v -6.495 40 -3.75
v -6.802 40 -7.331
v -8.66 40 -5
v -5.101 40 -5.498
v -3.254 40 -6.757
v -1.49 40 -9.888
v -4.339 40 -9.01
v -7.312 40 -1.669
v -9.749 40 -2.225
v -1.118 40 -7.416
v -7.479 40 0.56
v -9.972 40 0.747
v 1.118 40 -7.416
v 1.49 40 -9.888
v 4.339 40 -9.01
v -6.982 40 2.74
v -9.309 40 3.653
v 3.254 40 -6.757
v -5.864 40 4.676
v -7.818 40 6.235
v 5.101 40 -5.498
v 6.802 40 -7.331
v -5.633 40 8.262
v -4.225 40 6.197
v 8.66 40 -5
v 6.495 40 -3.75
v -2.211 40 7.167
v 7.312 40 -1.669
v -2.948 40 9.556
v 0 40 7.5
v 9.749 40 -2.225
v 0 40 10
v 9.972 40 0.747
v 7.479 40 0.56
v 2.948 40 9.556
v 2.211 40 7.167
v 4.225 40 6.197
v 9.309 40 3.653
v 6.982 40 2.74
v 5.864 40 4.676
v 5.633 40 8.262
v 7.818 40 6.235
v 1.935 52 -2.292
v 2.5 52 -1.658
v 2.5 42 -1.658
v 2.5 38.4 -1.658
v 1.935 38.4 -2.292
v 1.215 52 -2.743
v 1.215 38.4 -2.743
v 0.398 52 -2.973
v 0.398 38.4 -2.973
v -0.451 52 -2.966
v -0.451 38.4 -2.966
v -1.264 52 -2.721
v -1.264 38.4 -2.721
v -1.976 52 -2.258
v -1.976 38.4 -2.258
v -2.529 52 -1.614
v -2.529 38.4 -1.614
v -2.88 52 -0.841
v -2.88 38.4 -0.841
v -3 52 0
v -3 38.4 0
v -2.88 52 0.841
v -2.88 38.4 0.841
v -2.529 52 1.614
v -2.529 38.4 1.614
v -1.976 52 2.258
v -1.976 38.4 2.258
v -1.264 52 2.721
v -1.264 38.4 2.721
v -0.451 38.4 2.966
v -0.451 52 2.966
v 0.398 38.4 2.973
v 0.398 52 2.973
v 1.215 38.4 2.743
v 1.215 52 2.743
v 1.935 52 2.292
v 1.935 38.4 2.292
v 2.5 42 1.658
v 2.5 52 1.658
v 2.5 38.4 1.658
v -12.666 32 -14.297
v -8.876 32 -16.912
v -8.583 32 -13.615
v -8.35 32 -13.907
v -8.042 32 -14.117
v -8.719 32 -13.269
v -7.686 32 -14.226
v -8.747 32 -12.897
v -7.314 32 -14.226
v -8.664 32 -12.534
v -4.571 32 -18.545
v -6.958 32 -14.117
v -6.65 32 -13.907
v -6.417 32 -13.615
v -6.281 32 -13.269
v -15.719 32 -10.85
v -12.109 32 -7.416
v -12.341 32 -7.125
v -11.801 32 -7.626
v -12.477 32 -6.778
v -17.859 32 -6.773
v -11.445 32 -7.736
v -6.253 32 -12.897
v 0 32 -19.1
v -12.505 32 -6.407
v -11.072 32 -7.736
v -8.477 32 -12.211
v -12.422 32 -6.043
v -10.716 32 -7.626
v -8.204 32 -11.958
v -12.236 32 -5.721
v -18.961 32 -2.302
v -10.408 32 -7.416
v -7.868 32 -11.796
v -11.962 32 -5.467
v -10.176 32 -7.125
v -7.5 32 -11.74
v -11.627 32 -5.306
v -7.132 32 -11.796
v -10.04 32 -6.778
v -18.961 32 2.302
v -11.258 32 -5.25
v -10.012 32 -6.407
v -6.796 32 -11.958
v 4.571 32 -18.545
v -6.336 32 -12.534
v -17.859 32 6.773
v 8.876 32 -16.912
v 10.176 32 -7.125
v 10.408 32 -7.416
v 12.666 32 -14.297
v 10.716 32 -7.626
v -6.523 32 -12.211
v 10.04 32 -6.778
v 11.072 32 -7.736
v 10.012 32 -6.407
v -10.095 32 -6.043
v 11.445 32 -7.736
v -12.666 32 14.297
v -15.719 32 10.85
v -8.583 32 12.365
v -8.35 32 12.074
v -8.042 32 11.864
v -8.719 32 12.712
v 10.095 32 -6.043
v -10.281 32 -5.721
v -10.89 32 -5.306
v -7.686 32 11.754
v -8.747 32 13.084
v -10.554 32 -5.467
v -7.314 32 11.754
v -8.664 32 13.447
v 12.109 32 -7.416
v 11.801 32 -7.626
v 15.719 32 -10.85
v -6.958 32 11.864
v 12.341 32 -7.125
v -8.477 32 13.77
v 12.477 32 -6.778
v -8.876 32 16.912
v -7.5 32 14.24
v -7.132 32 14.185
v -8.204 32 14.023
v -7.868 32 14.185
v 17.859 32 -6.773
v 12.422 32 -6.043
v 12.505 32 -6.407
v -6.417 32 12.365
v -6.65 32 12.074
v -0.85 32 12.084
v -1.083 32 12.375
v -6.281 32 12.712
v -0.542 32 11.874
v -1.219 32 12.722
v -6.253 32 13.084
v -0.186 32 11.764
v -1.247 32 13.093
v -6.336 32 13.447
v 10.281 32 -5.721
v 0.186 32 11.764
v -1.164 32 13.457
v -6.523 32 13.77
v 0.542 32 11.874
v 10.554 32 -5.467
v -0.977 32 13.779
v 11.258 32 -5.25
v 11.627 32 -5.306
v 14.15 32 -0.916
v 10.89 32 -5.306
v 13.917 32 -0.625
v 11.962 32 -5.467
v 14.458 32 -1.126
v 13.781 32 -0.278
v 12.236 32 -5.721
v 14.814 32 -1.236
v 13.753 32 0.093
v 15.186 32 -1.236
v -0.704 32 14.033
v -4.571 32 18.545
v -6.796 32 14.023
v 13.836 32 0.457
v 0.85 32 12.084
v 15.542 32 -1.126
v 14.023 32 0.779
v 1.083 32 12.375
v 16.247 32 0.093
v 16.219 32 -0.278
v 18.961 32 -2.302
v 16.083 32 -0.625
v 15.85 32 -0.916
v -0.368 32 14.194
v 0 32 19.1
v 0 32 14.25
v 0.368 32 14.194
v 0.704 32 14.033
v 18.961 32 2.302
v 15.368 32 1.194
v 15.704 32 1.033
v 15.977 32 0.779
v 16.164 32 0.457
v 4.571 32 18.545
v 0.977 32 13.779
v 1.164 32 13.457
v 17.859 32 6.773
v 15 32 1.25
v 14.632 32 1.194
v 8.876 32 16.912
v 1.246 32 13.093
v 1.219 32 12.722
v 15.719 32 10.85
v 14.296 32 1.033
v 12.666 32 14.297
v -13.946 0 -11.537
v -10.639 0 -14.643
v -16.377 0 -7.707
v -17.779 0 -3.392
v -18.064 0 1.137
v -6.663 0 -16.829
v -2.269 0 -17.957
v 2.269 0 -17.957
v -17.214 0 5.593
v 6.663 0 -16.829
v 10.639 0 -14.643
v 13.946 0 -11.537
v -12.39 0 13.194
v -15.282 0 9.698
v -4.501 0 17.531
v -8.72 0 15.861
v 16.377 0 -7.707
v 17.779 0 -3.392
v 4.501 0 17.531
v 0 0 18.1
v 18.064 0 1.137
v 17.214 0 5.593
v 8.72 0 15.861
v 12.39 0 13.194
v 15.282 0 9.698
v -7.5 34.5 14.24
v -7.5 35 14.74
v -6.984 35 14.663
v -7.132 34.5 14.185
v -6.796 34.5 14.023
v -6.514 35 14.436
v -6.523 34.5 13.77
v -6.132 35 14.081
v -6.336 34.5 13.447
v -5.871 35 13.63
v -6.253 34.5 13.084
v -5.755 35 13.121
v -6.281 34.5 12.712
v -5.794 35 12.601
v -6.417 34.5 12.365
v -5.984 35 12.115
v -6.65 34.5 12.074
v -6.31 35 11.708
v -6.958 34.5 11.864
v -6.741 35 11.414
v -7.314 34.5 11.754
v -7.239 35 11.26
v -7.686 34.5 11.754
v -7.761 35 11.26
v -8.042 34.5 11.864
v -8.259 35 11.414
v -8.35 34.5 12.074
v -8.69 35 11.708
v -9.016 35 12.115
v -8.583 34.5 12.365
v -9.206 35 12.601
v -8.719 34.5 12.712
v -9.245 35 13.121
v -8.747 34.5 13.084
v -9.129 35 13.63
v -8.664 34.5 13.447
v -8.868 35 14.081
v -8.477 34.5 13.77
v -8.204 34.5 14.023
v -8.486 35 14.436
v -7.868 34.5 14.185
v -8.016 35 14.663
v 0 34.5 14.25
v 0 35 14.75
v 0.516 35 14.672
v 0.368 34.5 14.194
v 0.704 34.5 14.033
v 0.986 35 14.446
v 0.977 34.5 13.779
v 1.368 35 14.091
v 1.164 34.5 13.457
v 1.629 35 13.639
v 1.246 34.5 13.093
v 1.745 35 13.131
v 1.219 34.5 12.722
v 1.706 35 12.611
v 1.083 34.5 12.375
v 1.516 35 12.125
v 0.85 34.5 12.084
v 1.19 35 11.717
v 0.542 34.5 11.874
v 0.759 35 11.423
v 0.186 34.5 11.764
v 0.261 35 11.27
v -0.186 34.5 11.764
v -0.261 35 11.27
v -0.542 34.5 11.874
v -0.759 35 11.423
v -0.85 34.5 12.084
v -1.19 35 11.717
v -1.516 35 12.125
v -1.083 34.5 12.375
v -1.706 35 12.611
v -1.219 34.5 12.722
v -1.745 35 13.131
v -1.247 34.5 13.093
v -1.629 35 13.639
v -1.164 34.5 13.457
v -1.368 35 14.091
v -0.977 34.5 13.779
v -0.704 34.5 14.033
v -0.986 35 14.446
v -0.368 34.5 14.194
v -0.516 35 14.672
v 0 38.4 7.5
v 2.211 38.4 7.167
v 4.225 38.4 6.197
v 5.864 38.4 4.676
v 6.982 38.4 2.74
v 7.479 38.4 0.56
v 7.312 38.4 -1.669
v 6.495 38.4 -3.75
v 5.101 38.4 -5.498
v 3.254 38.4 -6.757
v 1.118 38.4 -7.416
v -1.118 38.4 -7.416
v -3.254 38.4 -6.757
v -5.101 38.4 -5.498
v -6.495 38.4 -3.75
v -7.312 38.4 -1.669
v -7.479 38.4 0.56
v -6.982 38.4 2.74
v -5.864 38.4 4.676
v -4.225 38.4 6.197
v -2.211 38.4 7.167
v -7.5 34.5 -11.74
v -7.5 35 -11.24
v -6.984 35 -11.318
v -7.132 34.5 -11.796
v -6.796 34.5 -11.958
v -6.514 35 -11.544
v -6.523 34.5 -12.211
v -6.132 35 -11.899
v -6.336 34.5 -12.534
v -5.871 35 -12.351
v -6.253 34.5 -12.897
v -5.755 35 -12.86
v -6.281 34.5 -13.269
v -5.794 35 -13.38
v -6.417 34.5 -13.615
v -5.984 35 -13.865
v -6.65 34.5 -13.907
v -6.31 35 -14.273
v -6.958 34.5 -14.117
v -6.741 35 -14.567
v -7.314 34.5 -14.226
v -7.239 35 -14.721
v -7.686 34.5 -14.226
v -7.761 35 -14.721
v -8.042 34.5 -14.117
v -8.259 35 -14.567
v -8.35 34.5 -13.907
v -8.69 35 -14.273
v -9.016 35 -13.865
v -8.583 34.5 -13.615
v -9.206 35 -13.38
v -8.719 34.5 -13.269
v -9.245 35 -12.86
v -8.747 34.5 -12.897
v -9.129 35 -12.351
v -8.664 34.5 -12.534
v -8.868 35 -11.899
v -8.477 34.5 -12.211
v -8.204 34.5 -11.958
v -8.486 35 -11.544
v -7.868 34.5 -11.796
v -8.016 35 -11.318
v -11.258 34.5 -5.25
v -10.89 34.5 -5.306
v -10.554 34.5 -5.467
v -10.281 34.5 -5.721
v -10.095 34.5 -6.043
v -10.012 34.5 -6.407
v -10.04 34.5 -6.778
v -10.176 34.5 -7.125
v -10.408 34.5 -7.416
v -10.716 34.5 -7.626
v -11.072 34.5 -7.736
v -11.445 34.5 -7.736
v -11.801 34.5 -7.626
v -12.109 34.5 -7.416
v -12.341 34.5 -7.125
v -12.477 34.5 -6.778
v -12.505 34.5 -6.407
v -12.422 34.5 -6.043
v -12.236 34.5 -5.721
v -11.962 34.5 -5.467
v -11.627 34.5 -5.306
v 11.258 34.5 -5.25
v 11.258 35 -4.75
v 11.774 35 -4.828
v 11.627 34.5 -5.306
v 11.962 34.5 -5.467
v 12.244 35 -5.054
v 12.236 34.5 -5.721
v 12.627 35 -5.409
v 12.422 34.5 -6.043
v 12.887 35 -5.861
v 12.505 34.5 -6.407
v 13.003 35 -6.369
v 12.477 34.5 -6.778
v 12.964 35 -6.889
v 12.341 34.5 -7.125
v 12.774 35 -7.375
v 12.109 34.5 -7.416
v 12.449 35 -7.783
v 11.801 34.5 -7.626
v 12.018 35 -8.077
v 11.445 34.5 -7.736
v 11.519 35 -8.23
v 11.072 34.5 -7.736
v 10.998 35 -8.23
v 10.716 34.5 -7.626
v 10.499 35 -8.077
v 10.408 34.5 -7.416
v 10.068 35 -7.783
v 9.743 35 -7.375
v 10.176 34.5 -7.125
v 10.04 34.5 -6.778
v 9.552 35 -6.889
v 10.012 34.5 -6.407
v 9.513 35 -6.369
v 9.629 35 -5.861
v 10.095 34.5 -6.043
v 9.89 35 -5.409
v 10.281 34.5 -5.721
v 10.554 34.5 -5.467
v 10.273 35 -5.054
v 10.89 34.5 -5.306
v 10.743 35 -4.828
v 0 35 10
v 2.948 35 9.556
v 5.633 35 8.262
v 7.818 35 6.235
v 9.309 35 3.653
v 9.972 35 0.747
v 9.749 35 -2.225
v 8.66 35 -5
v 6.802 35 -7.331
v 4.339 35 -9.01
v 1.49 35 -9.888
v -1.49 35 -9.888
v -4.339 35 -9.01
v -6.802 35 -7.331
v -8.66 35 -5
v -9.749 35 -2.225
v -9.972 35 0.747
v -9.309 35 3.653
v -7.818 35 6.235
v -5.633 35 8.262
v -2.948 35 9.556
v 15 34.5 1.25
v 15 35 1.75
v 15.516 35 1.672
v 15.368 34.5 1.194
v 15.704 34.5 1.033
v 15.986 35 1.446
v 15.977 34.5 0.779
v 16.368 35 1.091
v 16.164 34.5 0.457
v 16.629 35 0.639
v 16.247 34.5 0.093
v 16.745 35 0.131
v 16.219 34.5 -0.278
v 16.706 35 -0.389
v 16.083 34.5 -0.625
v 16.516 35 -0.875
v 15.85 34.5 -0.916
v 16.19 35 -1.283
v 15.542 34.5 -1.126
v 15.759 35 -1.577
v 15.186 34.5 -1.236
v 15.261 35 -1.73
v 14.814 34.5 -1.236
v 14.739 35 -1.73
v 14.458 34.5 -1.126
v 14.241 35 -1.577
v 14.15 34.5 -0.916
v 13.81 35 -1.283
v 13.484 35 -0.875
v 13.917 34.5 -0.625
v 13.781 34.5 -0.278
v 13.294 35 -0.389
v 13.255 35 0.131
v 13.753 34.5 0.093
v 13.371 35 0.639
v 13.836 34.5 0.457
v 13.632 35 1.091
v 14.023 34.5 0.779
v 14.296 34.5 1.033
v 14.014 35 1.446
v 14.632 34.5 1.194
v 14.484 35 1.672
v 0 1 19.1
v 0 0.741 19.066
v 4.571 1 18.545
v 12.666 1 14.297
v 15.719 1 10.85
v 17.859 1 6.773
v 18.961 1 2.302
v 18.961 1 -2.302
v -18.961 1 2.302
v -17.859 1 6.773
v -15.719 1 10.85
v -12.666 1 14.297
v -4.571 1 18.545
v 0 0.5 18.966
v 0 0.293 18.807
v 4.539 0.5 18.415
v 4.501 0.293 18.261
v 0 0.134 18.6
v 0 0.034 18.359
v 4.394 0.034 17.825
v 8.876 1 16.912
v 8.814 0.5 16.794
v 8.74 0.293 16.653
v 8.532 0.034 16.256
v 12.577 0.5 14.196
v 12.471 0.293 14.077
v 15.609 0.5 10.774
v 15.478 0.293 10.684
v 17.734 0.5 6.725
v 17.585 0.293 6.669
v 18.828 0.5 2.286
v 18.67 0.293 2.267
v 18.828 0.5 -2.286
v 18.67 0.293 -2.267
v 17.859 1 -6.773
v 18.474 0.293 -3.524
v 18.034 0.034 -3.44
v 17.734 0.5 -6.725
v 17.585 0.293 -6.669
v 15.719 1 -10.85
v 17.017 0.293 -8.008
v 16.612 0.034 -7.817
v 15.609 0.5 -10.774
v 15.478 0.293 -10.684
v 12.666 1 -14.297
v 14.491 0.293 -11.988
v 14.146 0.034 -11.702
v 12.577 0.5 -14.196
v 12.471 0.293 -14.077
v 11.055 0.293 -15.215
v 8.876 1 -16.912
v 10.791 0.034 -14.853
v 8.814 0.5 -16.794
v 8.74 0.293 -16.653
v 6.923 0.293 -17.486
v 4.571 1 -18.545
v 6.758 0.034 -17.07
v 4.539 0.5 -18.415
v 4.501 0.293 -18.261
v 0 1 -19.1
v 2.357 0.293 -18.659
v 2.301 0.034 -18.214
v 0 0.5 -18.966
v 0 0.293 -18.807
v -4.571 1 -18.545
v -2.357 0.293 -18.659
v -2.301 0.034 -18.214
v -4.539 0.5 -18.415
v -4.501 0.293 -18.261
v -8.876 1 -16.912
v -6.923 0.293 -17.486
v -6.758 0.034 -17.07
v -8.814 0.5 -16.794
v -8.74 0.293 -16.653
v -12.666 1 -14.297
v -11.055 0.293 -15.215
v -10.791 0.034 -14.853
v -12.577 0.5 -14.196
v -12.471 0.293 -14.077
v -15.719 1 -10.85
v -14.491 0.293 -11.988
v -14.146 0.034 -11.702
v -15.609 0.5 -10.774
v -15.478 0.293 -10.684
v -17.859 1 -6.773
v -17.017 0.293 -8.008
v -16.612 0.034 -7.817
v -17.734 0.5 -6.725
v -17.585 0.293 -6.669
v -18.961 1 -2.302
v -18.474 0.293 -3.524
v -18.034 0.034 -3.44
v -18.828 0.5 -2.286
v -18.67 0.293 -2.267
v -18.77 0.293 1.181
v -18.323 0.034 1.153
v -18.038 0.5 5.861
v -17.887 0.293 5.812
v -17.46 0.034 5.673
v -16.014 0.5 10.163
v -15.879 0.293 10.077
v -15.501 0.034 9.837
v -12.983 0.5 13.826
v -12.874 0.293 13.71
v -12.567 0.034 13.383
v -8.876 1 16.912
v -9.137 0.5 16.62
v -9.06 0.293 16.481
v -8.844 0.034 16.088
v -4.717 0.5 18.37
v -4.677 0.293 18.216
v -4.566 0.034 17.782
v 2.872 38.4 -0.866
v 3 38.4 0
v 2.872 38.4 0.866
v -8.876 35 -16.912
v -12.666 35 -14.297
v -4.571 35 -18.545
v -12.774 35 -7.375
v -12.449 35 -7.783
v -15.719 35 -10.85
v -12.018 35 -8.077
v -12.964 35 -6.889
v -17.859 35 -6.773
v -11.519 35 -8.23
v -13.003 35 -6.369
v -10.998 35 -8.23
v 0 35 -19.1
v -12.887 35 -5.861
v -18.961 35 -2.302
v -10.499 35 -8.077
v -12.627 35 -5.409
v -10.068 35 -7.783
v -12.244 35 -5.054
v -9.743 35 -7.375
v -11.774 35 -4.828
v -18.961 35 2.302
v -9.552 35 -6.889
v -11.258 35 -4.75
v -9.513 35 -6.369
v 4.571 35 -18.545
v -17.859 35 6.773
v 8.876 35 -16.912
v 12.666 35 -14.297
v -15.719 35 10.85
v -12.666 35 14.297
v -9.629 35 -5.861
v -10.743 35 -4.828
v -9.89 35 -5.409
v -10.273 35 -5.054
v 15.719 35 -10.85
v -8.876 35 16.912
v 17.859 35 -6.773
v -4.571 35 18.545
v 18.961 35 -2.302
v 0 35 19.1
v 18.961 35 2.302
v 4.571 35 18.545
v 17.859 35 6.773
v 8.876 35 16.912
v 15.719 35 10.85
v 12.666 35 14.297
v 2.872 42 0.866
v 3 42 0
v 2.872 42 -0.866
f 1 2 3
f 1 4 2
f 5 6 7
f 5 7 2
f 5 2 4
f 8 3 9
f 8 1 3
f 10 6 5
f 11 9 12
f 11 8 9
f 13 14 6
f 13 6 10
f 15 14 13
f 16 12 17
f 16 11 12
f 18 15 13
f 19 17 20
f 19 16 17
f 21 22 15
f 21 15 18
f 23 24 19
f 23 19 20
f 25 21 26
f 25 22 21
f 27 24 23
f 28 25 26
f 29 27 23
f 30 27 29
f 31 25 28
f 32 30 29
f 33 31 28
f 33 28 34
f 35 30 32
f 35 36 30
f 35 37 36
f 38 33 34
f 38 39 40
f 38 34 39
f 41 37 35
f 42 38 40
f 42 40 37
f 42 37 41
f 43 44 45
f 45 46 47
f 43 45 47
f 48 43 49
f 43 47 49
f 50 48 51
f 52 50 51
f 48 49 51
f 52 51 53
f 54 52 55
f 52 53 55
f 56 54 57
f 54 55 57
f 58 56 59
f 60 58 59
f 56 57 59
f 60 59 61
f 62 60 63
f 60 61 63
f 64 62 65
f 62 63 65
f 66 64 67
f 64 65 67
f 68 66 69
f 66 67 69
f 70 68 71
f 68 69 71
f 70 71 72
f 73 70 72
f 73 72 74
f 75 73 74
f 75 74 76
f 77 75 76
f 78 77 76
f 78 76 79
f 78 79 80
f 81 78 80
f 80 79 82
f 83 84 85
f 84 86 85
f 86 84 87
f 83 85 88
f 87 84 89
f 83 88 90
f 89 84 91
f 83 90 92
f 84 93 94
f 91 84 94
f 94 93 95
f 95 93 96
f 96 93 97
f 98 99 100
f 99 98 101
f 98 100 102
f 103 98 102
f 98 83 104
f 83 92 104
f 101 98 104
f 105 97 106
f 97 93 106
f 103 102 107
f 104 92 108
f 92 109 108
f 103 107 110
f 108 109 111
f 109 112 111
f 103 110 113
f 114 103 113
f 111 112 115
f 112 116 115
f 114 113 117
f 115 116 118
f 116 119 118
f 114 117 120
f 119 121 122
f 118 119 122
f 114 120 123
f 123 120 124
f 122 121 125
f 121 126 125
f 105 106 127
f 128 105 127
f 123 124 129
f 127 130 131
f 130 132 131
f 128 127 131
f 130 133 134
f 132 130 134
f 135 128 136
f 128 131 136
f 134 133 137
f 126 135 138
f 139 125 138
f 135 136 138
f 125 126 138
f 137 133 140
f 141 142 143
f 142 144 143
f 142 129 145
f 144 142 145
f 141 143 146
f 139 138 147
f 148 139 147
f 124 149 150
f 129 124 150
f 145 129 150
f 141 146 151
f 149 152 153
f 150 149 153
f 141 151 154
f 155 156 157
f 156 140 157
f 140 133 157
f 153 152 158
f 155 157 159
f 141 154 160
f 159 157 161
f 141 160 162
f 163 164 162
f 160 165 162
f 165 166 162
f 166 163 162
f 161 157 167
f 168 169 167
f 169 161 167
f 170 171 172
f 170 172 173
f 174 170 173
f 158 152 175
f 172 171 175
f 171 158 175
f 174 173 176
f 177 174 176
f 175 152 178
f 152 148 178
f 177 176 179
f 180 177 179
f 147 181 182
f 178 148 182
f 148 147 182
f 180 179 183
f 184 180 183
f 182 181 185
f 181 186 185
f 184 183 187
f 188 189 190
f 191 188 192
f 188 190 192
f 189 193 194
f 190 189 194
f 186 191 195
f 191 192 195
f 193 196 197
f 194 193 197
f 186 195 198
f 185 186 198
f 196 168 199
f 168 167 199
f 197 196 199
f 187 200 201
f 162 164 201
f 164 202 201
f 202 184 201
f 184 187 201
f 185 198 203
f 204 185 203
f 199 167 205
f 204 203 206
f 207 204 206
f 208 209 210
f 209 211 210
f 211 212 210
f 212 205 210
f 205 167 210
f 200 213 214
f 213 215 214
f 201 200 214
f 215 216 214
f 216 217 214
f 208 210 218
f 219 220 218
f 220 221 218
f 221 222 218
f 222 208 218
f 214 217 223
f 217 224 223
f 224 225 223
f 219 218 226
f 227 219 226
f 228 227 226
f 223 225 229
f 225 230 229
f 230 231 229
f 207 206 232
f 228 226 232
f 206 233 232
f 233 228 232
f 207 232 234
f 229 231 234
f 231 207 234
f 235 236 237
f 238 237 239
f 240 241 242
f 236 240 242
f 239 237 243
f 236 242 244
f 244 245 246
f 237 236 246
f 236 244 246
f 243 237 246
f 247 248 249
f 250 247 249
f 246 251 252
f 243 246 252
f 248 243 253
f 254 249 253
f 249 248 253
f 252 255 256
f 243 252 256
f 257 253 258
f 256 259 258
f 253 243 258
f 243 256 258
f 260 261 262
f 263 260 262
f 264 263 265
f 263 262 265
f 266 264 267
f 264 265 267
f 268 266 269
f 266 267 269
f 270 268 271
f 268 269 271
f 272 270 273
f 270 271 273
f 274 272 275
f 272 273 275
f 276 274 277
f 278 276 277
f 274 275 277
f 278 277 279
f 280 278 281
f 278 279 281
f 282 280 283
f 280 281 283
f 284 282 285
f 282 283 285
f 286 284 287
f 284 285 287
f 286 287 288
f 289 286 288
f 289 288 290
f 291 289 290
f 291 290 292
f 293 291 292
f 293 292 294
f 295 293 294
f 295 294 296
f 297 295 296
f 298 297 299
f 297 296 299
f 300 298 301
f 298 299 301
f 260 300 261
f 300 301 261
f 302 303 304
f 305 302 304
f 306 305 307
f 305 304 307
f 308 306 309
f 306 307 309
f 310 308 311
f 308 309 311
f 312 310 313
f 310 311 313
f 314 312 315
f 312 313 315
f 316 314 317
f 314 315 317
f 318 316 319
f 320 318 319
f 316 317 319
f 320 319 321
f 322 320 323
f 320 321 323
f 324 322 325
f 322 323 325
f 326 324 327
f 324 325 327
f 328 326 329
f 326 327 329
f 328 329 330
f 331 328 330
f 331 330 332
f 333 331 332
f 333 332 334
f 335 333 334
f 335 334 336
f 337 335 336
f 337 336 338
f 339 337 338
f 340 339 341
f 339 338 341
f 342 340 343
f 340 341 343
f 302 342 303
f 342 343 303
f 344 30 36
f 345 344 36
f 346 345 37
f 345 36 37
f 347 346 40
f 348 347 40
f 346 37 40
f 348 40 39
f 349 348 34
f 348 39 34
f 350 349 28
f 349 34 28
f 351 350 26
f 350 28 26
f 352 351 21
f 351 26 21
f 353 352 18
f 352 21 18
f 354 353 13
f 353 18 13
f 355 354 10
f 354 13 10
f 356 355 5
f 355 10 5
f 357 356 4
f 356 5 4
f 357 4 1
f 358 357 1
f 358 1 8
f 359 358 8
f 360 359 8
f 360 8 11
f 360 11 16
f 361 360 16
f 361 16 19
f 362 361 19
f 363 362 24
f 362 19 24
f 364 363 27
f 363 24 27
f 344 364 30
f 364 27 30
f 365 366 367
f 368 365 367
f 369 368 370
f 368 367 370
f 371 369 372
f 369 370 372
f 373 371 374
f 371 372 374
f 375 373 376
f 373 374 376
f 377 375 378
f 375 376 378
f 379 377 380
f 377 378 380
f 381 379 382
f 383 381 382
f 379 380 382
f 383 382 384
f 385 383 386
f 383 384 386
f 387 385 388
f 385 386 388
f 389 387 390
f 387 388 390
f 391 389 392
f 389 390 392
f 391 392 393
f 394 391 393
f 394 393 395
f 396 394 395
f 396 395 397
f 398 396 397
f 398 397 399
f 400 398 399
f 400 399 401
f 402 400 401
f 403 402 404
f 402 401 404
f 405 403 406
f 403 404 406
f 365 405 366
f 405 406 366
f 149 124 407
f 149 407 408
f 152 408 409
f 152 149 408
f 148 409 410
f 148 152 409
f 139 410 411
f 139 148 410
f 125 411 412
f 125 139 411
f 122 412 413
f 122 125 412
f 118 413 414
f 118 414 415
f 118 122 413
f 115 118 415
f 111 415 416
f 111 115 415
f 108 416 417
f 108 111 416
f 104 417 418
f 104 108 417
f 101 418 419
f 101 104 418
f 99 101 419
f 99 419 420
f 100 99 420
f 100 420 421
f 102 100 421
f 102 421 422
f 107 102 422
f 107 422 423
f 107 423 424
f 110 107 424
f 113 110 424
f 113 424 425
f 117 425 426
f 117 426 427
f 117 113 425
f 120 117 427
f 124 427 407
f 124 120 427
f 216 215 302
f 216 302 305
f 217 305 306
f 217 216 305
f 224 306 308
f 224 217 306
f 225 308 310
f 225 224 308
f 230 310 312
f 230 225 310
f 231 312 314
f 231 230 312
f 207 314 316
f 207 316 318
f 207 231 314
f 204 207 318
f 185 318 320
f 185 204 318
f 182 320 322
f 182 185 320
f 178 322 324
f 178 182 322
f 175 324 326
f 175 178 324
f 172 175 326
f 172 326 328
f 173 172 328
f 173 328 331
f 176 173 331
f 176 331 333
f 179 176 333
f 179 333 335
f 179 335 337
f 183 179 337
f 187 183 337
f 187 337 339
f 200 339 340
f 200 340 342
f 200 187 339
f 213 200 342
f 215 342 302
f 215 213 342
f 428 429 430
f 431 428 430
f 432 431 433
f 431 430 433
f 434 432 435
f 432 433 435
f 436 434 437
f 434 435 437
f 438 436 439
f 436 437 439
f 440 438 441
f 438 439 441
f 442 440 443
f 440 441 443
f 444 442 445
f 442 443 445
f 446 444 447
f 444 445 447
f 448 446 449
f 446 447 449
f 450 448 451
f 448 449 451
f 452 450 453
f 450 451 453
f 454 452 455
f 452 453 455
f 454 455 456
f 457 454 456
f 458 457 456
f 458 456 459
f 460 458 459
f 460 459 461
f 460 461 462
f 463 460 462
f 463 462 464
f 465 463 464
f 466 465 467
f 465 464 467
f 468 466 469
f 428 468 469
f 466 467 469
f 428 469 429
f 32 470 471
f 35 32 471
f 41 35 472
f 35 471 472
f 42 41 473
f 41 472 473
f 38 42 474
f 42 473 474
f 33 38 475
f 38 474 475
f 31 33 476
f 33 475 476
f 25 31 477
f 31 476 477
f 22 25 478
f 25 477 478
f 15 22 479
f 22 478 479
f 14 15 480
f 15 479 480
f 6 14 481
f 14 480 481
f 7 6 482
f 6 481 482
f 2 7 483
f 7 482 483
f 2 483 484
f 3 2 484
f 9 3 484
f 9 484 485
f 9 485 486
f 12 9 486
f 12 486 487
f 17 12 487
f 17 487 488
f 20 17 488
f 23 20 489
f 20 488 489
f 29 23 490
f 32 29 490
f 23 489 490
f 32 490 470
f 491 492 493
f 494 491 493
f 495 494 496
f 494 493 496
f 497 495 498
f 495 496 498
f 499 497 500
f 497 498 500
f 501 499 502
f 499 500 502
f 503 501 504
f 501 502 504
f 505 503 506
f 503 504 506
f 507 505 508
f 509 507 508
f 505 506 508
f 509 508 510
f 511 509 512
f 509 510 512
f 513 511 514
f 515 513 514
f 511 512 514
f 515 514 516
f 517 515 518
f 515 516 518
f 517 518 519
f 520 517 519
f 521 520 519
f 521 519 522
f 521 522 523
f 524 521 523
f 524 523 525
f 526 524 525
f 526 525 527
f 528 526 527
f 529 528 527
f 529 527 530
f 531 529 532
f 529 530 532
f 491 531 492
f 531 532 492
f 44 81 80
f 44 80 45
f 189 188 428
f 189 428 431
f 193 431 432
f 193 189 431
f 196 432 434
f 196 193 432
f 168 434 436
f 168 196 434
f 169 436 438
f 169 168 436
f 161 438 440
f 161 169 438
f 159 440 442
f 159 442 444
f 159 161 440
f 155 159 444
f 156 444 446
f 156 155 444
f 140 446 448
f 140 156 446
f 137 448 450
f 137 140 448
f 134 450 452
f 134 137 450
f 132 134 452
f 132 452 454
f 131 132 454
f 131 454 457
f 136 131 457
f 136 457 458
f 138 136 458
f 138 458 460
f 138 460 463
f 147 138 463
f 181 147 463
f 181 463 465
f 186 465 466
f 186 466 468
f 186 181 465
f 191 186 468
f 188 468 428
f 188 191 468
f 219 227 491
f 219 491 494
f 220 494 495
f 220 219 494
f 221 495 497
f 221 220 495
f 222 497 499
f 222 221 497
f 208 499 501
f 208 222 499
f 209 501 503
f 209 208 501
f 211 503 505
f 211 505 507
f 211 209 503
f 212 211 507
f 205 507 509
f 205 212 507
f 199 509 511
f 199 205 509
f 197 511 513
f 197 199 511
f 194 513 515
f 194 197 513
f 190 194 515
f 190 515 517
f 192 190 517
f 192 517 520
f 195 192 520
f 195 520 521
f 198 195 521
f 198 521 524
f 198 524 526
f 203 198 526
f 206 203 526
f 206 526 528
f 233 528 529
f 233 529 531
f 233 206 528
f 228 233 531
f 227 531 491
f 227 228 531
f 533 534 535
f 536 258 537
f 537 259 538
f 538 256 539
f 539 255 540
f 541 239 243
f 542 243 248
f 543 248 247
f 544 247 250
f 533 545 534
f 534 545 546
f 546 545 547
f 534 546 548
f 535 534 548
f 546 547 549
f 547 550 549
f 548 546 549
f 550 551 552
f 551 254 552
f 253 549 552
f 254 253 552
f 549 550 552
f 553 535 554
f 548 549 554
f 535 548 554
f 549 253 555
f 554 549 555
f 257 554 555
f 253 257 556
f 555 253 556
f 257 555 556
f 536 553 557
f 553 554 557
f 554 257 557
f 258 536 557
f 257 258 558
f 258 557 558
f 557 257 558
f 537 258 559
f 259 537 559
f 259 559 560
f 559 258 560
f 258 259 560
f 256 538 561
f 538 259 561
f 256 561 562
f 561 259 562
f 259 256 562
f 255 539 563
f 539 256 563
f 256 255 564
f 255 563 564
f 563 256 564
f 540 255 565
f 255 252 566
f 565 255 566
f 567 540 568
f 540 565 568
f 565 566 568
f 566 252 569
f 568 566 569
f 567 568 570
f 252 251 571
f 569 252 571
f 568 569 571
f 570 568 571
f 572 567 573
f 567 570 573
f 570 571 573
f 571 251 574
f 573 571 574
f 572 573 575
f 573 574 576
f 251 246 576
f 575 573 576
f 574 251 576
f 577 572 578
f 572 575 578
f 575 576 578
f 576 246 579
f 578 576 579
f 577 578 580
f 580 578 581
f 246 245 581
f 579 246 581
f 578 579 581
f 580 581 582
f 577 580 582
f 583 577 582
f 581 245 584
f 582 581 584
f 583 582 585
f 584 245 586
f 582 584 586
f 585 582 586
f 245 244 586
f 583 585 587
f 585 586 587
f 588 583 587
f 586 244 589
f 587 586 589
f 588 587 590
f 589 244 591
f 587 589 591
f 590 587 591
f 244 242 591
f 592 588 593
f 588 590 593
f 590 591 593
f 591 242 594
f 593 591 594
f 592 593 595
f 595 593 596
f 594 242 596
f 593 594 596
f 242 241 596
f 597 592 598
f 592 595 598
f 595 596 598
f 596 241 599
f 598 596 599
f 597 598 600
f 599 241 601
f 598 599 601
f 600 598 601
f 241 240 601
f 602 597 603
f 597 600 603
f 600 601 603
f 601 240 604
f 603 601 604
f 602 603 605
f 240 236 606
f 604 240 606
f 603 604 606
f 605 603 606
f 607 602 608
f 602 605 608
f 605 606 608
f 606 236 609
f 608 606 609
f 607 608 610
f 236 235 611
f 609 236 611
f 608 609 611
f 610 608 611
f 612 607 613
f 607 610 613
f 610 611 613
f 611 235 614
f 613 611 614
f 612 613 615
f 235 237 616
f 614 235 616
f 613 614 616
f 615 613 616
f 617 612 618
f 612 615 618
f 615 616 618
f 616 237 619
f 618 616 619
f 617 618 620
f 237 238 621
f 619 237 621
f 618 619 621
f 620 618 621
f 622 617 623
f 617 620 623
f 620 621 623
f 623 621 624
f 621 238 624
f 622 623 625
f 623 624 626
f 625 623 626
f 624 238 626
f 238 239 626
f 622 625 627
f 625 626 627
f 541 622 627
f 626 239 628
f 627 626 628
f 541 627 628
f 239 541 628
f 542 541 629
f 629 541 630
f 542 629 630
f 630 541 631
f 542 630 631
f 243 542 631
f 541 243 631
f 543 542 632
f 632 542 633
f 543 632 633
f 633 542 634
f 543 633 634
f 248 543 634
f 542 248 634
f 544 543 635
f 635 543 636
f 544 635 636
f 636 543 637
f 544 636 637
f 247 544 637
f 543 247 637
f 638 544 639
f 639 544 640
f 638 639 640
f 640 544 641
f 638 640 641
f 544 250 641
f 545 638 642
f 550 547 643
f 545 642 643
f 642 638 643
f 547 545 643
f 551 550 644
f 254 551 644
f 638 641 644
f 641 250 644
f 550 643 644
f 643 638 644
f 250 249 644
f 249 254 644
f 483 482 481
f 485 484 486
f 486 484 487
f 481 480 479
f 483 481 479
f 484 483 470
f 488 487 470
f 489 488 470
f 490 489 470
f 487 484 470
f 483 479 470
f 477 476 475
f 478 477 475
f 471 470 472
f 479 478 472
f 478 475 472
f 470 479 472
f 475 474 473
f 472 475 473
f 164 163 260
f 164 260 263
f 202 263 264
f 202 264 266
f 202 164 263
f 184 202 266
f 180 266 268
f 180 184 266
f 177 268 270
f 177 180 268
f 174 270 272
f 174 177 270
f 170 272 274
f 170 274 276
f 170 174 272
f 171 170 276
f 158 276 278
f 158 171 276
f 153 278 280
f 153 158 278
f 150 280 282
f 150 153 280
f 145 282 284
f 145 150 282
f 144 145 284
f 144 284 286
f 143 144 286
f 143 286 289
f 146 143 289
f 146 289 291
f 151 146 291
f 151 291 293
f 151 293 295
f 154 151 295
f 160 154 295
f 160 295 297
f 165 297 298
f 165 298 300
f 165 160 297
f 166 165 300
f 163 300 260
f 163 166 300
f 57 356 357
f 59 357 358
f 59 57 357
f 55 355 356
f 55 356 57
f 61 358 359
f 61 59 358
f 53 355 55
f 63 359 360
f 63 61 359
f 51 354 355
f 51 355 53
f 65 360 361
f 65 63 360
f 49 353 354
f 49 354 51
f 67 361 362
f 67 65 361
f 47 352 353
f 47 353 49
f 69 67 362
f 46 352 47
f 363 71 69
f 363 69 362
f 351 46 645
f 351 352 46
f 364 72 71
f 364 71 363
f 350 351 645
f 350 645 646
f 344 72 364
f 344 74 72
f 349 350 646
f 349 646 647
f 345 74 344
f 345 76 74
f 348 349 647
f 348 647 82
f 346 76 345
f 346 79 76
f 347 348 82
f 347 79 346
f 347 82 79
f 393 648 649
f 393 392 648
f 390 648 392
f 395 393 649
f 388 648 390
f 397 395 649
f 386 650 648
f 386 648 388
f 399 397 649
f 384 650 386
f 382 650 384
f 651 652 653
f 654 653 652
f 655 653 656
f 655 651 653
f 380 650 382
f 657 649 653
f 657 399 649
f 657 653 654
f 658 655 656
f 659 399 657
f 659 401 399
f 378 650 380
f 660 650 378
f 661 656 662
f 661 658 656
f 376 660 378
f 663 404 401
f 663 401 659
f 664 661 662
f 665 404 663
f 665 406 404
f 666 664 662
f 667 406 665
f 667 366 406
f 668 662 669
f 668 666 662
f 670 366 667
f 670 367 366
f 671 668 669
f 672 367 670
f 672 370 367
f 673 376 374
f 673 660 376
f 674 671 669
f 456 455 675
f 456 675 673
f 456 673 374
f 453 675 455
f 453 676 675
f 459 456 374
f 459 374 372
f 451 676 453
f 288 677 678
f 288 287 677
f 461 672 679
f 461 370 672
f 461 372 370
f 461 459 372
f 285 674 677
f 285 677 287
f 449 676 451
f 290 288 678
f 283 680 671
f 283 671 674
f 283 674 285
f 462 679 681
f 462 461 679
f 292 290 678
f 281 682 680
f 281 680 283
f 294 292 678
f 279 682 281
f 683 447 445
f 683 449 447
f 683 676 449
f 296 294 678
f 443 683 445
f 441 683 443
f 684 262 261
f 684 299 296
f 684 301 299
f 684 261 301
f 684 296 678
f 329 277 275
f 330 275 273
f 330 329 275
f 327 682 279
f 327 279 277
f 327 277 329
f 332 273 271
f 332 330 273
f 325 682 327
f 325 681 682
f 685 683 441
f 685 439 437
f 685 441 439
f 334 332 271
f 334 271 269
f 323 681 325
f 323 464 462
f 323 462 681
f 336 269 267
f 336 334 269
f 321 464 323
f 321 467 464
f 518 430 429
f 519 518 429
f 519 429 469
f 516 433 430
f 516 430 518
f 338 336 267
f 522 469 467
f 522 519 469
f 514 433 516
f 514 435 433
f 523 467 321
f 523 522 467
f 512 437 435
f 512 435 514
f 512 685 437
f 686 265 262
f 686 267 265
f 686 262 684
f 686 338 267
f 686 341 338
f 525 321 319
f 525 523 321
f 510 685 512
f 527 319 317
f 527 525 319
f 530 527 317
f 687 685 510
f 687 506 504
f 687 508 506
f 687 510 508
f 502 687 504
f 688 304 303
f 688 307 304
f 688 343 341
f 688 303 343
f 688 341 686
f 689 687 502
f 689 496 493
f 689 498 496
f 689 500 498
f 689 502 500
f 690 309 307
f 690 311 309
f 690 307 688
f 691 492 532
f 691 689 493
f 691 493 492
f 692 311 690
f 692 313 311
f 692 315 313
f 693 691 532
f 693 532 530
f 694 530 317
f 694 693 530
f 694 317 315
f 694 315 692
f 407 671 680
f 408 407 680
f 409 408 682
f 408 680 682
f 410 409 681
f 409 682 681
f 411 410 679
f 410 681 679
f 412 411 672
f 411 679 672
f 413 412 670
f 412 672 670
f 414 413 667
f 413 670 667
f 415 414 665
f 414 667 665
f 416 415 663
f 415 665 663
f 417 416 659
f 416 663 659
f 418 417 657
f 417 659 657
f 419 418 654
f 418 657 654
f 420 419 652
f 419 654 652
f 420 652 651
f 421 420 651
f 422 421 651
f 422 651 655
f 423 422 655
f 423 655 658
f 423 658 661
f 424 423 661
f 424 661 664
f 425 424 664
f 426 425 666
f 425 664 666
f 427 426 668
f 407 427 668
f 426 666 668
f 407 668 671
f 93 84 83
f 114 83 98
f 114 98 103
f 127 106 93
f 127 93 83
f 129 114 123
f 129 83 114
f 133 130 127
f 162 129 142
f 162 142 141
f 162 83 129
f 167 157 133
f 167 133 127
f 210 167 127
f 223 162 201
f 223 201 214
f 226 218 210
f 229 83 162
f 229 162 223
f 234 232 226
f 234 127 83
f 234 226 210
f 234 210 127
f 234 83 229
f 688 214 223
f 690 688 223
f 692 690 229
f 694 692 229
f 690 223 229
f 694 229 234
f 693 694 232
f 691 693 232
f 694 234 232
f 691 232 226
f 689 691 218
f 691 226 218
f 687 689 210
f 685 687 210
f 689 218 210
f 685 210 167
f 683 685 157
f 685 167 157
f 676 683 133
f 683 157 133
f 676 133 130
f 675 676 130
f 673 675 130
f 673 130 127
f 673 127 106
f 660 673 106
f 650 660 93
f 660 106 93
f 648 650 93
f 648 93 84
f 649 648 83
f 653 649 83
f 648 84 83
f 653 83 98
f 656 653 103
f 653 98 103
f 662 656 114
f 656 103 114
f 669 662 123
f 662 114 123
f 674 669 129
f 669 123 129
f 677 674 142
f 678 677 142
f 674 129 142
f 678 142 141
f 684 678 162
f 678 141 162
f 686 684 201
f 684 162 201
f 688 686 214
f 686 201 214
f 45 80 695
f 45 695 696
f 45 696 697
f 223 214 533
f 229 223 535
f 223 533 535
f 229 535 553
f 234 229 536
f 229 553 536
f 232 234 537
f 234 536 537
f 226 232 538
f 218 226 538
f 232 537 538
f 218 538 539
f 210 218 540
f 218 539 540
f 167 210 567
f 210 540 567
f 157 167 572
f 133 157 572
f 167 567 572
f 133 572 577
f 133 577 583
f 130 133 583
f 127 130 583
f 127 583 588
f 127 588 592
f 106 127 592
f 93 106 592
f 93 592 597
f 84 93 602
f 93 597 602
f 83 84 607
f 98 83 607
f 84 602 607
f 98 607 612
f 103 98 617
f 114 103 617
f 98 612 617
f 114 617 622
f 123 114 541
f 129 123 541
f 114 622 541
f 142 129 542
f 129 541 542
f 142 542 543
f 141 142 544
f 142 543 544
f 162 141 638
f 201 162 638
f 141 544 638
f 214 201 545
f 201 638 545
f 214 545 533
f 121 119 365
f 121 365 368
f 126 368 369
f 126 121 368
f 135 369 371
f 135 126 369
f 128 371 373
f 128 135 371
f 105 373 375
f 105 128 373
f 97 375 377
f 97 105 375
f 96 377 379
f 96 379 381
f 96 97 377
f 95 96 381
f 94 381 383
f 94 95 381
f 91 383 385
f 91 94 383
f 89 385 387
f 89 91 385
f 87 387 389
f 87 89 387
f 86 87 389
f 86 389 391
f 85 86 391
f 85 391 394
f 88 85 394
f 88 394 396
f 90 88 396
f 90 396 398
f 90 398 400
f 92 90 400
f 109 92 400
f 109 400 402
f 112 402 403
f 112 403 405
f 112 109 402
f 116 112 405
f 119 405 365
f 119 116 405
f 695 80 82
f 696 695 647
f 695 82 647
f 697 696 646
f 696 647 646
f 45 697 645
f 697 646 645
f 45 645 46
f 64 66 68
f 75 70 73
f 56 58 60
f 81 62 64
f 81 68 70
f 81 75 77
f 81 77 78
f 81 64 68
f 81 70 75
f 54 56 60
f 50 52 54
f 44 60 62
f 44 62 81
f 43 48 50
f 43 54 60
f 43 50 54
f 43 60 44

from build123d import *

# Parameters (mm, degrees)
SKETCH1_R            = 19.1
BOSS_EXTRUDE1_DEPTH  = 32
FILLET1_R            = 1
SKETCH3_R            = 19.1
SKETCH3_R_2          = 1.25
BOSS_EXTRUDE6_DEPTH  = 3
SKETCH5_R            = 10
BOSS_EXTRUDE7_DEPTH  = 5
SKETCH7_R            = 7.5
CUT_EXTRUDE1_DEPTH   = 1.6
BOSS_EXTRUDE9_DEPTH  = 13.6
SKETCH8_3_R          = 3
BOSS_EXTRUDE10_DEPTH = 3.6
CHAMFER1_SIZE        = 0.5


with BuildPart() as part:
    # Sketch1 → Boss-Extrude1 (new body)
    with BuildSketch(Plane(origin=(0, 0, 0), x_dir=(1, 0, 0), z_dir=(0, 1, 0))):
        with Locations(Location((0, 0, 0), (0, 0, 270))):
            Circle(SKETCH1_R)
    extrude(amount=BOSS_EXTRUDE1_DEPTH)

    # Fillet1
    fillet1_edges = [part.edges().sort_by_distance(p)[0] for p in [
        (0, 0, -19.1),
    ]]
    fillet(fillet1_edges, radius=FILLET1_R)


with BuildPart() as body_2:
    # Sketch3 → Boss-Extrude6 (new body)
    with BuildSketch(Plane(origin=(0, 32, 0), x_dir=(1, 0, 0), z_dir=(0, 1, 0))):
        with Locations(Location((0, 0, 0), (0, 0, 270))):
            Circle(SKETCH3_R)
        with Locations(Location((15, 0, 0), (0, 0, 270))):
            Circle(SKETCH3_R_2, mode=Mode.SUBTRACT)
        with Locations(Location((-7.5, -12.990381057, 0), (0, 0, 270))):
            Circle(SKETCH3_R_2, mode=Mode.SUBTRACT)
        with Locations(Location((-7.5, 12.990381057, 0), (0, 0, 270))):
            Circle(SKETCH3_R_2, mode=Mode.SUBTRACT)
        with Locations(Location((-6.168e-06, -13, 0), (0, 0, 270))):
            Circle(SKETCH3_R_2, mode=Mode.SUBTRACT)
        with Locations(Location((11.258333333, 6.499994658, 0), (0, 0, 270))):
            Circle(SKETCH3_R_2, mode=Mode.SUBTRACT)
        with Locations(Location((-11.258327165, 6.500005342, 0), (0, 0, 270))):
            Circle(SKETCH3_R_2, mode=Mode.SUBTRACT)
    extrude(amount=BOSS_EXTRUDE6_DEPTH)

    # Chamfer1
    chamfer1_edges = [body_2.edges().sort_by_distance(p)[0] for p in [
        (-11.258327165, 35, -7.750005342),
        (11.258333333, 35, -7.749994658),
        (-7.5, 35, -14.240381057),
        (15, 35, -1.25),
        (-7.5, 35, 11.740381057),
        (-6.168e-06, 35, 11.75),
    ]]
    chamfer(chamfer1_edges, length=CHAMFER1_SIZE)


with BuildPart() as body_3:
    # Sketch5 → Boss-Extrude7 (new body)
    with BuildSketch(Plane(origin=(0, 35, 0), x_dir=(1, 0, 0), z_dir=(0, 1, 0))):
        with Locations(Location((0, 0, 0), (0, 0, 270))):
            Circle(SKETCH5_R)
    extrude(amount=BOSS_EXTRUDE7_DEPTH)

    # Sketch7 → Cut-Extrude1 (cut)
    with BuildSketch(Plane(origin=(0, 40, 0), x_dir=(1, 0, 0), z_dir=(0, 1, 0))):
        with Locations(Location((0, 0, 0), (0, 0, 270))):
            Circle(SKETCH7_R)
    extrude(amount=-CUT_EXTRUDE1_DEPTH, mode=Mode.SUBTRACT)

    # Sketch8 → Boss-Extrude9 (add)
    with BuildSketch(Plane(origin=(0, 38.4, 0), x_dir=(1, 0, 0), z_dir=(0, 1, 0))):
        with BuildLine():
            Line((2.5, -1.658312395), (2.5, 1.658312395))
            ThreePointArc((2.5, 1.658312395), (-3, 0), (2.5, -1.658312395))
        make_face()
    extrude(amount=BOSS_EXTRUDE9_DEPTH)

    # Sketch8<3> → Boss-Extrude10 (add)
    with BuildSketch(Plane(origin=(0, 38.4, 0), x_dir=(1, 0, 0), z_dir=(0, 1, 0))):
        with Locations(Location((0, 0, 0), (0, 0, 33.557309762))):
            Circle(SKETCH8_3_R)
    extrude(amount=BOSS_EXTRUDE10_DEPTH)


solid = Compound([part.part, body_2.part, body_3.part])
